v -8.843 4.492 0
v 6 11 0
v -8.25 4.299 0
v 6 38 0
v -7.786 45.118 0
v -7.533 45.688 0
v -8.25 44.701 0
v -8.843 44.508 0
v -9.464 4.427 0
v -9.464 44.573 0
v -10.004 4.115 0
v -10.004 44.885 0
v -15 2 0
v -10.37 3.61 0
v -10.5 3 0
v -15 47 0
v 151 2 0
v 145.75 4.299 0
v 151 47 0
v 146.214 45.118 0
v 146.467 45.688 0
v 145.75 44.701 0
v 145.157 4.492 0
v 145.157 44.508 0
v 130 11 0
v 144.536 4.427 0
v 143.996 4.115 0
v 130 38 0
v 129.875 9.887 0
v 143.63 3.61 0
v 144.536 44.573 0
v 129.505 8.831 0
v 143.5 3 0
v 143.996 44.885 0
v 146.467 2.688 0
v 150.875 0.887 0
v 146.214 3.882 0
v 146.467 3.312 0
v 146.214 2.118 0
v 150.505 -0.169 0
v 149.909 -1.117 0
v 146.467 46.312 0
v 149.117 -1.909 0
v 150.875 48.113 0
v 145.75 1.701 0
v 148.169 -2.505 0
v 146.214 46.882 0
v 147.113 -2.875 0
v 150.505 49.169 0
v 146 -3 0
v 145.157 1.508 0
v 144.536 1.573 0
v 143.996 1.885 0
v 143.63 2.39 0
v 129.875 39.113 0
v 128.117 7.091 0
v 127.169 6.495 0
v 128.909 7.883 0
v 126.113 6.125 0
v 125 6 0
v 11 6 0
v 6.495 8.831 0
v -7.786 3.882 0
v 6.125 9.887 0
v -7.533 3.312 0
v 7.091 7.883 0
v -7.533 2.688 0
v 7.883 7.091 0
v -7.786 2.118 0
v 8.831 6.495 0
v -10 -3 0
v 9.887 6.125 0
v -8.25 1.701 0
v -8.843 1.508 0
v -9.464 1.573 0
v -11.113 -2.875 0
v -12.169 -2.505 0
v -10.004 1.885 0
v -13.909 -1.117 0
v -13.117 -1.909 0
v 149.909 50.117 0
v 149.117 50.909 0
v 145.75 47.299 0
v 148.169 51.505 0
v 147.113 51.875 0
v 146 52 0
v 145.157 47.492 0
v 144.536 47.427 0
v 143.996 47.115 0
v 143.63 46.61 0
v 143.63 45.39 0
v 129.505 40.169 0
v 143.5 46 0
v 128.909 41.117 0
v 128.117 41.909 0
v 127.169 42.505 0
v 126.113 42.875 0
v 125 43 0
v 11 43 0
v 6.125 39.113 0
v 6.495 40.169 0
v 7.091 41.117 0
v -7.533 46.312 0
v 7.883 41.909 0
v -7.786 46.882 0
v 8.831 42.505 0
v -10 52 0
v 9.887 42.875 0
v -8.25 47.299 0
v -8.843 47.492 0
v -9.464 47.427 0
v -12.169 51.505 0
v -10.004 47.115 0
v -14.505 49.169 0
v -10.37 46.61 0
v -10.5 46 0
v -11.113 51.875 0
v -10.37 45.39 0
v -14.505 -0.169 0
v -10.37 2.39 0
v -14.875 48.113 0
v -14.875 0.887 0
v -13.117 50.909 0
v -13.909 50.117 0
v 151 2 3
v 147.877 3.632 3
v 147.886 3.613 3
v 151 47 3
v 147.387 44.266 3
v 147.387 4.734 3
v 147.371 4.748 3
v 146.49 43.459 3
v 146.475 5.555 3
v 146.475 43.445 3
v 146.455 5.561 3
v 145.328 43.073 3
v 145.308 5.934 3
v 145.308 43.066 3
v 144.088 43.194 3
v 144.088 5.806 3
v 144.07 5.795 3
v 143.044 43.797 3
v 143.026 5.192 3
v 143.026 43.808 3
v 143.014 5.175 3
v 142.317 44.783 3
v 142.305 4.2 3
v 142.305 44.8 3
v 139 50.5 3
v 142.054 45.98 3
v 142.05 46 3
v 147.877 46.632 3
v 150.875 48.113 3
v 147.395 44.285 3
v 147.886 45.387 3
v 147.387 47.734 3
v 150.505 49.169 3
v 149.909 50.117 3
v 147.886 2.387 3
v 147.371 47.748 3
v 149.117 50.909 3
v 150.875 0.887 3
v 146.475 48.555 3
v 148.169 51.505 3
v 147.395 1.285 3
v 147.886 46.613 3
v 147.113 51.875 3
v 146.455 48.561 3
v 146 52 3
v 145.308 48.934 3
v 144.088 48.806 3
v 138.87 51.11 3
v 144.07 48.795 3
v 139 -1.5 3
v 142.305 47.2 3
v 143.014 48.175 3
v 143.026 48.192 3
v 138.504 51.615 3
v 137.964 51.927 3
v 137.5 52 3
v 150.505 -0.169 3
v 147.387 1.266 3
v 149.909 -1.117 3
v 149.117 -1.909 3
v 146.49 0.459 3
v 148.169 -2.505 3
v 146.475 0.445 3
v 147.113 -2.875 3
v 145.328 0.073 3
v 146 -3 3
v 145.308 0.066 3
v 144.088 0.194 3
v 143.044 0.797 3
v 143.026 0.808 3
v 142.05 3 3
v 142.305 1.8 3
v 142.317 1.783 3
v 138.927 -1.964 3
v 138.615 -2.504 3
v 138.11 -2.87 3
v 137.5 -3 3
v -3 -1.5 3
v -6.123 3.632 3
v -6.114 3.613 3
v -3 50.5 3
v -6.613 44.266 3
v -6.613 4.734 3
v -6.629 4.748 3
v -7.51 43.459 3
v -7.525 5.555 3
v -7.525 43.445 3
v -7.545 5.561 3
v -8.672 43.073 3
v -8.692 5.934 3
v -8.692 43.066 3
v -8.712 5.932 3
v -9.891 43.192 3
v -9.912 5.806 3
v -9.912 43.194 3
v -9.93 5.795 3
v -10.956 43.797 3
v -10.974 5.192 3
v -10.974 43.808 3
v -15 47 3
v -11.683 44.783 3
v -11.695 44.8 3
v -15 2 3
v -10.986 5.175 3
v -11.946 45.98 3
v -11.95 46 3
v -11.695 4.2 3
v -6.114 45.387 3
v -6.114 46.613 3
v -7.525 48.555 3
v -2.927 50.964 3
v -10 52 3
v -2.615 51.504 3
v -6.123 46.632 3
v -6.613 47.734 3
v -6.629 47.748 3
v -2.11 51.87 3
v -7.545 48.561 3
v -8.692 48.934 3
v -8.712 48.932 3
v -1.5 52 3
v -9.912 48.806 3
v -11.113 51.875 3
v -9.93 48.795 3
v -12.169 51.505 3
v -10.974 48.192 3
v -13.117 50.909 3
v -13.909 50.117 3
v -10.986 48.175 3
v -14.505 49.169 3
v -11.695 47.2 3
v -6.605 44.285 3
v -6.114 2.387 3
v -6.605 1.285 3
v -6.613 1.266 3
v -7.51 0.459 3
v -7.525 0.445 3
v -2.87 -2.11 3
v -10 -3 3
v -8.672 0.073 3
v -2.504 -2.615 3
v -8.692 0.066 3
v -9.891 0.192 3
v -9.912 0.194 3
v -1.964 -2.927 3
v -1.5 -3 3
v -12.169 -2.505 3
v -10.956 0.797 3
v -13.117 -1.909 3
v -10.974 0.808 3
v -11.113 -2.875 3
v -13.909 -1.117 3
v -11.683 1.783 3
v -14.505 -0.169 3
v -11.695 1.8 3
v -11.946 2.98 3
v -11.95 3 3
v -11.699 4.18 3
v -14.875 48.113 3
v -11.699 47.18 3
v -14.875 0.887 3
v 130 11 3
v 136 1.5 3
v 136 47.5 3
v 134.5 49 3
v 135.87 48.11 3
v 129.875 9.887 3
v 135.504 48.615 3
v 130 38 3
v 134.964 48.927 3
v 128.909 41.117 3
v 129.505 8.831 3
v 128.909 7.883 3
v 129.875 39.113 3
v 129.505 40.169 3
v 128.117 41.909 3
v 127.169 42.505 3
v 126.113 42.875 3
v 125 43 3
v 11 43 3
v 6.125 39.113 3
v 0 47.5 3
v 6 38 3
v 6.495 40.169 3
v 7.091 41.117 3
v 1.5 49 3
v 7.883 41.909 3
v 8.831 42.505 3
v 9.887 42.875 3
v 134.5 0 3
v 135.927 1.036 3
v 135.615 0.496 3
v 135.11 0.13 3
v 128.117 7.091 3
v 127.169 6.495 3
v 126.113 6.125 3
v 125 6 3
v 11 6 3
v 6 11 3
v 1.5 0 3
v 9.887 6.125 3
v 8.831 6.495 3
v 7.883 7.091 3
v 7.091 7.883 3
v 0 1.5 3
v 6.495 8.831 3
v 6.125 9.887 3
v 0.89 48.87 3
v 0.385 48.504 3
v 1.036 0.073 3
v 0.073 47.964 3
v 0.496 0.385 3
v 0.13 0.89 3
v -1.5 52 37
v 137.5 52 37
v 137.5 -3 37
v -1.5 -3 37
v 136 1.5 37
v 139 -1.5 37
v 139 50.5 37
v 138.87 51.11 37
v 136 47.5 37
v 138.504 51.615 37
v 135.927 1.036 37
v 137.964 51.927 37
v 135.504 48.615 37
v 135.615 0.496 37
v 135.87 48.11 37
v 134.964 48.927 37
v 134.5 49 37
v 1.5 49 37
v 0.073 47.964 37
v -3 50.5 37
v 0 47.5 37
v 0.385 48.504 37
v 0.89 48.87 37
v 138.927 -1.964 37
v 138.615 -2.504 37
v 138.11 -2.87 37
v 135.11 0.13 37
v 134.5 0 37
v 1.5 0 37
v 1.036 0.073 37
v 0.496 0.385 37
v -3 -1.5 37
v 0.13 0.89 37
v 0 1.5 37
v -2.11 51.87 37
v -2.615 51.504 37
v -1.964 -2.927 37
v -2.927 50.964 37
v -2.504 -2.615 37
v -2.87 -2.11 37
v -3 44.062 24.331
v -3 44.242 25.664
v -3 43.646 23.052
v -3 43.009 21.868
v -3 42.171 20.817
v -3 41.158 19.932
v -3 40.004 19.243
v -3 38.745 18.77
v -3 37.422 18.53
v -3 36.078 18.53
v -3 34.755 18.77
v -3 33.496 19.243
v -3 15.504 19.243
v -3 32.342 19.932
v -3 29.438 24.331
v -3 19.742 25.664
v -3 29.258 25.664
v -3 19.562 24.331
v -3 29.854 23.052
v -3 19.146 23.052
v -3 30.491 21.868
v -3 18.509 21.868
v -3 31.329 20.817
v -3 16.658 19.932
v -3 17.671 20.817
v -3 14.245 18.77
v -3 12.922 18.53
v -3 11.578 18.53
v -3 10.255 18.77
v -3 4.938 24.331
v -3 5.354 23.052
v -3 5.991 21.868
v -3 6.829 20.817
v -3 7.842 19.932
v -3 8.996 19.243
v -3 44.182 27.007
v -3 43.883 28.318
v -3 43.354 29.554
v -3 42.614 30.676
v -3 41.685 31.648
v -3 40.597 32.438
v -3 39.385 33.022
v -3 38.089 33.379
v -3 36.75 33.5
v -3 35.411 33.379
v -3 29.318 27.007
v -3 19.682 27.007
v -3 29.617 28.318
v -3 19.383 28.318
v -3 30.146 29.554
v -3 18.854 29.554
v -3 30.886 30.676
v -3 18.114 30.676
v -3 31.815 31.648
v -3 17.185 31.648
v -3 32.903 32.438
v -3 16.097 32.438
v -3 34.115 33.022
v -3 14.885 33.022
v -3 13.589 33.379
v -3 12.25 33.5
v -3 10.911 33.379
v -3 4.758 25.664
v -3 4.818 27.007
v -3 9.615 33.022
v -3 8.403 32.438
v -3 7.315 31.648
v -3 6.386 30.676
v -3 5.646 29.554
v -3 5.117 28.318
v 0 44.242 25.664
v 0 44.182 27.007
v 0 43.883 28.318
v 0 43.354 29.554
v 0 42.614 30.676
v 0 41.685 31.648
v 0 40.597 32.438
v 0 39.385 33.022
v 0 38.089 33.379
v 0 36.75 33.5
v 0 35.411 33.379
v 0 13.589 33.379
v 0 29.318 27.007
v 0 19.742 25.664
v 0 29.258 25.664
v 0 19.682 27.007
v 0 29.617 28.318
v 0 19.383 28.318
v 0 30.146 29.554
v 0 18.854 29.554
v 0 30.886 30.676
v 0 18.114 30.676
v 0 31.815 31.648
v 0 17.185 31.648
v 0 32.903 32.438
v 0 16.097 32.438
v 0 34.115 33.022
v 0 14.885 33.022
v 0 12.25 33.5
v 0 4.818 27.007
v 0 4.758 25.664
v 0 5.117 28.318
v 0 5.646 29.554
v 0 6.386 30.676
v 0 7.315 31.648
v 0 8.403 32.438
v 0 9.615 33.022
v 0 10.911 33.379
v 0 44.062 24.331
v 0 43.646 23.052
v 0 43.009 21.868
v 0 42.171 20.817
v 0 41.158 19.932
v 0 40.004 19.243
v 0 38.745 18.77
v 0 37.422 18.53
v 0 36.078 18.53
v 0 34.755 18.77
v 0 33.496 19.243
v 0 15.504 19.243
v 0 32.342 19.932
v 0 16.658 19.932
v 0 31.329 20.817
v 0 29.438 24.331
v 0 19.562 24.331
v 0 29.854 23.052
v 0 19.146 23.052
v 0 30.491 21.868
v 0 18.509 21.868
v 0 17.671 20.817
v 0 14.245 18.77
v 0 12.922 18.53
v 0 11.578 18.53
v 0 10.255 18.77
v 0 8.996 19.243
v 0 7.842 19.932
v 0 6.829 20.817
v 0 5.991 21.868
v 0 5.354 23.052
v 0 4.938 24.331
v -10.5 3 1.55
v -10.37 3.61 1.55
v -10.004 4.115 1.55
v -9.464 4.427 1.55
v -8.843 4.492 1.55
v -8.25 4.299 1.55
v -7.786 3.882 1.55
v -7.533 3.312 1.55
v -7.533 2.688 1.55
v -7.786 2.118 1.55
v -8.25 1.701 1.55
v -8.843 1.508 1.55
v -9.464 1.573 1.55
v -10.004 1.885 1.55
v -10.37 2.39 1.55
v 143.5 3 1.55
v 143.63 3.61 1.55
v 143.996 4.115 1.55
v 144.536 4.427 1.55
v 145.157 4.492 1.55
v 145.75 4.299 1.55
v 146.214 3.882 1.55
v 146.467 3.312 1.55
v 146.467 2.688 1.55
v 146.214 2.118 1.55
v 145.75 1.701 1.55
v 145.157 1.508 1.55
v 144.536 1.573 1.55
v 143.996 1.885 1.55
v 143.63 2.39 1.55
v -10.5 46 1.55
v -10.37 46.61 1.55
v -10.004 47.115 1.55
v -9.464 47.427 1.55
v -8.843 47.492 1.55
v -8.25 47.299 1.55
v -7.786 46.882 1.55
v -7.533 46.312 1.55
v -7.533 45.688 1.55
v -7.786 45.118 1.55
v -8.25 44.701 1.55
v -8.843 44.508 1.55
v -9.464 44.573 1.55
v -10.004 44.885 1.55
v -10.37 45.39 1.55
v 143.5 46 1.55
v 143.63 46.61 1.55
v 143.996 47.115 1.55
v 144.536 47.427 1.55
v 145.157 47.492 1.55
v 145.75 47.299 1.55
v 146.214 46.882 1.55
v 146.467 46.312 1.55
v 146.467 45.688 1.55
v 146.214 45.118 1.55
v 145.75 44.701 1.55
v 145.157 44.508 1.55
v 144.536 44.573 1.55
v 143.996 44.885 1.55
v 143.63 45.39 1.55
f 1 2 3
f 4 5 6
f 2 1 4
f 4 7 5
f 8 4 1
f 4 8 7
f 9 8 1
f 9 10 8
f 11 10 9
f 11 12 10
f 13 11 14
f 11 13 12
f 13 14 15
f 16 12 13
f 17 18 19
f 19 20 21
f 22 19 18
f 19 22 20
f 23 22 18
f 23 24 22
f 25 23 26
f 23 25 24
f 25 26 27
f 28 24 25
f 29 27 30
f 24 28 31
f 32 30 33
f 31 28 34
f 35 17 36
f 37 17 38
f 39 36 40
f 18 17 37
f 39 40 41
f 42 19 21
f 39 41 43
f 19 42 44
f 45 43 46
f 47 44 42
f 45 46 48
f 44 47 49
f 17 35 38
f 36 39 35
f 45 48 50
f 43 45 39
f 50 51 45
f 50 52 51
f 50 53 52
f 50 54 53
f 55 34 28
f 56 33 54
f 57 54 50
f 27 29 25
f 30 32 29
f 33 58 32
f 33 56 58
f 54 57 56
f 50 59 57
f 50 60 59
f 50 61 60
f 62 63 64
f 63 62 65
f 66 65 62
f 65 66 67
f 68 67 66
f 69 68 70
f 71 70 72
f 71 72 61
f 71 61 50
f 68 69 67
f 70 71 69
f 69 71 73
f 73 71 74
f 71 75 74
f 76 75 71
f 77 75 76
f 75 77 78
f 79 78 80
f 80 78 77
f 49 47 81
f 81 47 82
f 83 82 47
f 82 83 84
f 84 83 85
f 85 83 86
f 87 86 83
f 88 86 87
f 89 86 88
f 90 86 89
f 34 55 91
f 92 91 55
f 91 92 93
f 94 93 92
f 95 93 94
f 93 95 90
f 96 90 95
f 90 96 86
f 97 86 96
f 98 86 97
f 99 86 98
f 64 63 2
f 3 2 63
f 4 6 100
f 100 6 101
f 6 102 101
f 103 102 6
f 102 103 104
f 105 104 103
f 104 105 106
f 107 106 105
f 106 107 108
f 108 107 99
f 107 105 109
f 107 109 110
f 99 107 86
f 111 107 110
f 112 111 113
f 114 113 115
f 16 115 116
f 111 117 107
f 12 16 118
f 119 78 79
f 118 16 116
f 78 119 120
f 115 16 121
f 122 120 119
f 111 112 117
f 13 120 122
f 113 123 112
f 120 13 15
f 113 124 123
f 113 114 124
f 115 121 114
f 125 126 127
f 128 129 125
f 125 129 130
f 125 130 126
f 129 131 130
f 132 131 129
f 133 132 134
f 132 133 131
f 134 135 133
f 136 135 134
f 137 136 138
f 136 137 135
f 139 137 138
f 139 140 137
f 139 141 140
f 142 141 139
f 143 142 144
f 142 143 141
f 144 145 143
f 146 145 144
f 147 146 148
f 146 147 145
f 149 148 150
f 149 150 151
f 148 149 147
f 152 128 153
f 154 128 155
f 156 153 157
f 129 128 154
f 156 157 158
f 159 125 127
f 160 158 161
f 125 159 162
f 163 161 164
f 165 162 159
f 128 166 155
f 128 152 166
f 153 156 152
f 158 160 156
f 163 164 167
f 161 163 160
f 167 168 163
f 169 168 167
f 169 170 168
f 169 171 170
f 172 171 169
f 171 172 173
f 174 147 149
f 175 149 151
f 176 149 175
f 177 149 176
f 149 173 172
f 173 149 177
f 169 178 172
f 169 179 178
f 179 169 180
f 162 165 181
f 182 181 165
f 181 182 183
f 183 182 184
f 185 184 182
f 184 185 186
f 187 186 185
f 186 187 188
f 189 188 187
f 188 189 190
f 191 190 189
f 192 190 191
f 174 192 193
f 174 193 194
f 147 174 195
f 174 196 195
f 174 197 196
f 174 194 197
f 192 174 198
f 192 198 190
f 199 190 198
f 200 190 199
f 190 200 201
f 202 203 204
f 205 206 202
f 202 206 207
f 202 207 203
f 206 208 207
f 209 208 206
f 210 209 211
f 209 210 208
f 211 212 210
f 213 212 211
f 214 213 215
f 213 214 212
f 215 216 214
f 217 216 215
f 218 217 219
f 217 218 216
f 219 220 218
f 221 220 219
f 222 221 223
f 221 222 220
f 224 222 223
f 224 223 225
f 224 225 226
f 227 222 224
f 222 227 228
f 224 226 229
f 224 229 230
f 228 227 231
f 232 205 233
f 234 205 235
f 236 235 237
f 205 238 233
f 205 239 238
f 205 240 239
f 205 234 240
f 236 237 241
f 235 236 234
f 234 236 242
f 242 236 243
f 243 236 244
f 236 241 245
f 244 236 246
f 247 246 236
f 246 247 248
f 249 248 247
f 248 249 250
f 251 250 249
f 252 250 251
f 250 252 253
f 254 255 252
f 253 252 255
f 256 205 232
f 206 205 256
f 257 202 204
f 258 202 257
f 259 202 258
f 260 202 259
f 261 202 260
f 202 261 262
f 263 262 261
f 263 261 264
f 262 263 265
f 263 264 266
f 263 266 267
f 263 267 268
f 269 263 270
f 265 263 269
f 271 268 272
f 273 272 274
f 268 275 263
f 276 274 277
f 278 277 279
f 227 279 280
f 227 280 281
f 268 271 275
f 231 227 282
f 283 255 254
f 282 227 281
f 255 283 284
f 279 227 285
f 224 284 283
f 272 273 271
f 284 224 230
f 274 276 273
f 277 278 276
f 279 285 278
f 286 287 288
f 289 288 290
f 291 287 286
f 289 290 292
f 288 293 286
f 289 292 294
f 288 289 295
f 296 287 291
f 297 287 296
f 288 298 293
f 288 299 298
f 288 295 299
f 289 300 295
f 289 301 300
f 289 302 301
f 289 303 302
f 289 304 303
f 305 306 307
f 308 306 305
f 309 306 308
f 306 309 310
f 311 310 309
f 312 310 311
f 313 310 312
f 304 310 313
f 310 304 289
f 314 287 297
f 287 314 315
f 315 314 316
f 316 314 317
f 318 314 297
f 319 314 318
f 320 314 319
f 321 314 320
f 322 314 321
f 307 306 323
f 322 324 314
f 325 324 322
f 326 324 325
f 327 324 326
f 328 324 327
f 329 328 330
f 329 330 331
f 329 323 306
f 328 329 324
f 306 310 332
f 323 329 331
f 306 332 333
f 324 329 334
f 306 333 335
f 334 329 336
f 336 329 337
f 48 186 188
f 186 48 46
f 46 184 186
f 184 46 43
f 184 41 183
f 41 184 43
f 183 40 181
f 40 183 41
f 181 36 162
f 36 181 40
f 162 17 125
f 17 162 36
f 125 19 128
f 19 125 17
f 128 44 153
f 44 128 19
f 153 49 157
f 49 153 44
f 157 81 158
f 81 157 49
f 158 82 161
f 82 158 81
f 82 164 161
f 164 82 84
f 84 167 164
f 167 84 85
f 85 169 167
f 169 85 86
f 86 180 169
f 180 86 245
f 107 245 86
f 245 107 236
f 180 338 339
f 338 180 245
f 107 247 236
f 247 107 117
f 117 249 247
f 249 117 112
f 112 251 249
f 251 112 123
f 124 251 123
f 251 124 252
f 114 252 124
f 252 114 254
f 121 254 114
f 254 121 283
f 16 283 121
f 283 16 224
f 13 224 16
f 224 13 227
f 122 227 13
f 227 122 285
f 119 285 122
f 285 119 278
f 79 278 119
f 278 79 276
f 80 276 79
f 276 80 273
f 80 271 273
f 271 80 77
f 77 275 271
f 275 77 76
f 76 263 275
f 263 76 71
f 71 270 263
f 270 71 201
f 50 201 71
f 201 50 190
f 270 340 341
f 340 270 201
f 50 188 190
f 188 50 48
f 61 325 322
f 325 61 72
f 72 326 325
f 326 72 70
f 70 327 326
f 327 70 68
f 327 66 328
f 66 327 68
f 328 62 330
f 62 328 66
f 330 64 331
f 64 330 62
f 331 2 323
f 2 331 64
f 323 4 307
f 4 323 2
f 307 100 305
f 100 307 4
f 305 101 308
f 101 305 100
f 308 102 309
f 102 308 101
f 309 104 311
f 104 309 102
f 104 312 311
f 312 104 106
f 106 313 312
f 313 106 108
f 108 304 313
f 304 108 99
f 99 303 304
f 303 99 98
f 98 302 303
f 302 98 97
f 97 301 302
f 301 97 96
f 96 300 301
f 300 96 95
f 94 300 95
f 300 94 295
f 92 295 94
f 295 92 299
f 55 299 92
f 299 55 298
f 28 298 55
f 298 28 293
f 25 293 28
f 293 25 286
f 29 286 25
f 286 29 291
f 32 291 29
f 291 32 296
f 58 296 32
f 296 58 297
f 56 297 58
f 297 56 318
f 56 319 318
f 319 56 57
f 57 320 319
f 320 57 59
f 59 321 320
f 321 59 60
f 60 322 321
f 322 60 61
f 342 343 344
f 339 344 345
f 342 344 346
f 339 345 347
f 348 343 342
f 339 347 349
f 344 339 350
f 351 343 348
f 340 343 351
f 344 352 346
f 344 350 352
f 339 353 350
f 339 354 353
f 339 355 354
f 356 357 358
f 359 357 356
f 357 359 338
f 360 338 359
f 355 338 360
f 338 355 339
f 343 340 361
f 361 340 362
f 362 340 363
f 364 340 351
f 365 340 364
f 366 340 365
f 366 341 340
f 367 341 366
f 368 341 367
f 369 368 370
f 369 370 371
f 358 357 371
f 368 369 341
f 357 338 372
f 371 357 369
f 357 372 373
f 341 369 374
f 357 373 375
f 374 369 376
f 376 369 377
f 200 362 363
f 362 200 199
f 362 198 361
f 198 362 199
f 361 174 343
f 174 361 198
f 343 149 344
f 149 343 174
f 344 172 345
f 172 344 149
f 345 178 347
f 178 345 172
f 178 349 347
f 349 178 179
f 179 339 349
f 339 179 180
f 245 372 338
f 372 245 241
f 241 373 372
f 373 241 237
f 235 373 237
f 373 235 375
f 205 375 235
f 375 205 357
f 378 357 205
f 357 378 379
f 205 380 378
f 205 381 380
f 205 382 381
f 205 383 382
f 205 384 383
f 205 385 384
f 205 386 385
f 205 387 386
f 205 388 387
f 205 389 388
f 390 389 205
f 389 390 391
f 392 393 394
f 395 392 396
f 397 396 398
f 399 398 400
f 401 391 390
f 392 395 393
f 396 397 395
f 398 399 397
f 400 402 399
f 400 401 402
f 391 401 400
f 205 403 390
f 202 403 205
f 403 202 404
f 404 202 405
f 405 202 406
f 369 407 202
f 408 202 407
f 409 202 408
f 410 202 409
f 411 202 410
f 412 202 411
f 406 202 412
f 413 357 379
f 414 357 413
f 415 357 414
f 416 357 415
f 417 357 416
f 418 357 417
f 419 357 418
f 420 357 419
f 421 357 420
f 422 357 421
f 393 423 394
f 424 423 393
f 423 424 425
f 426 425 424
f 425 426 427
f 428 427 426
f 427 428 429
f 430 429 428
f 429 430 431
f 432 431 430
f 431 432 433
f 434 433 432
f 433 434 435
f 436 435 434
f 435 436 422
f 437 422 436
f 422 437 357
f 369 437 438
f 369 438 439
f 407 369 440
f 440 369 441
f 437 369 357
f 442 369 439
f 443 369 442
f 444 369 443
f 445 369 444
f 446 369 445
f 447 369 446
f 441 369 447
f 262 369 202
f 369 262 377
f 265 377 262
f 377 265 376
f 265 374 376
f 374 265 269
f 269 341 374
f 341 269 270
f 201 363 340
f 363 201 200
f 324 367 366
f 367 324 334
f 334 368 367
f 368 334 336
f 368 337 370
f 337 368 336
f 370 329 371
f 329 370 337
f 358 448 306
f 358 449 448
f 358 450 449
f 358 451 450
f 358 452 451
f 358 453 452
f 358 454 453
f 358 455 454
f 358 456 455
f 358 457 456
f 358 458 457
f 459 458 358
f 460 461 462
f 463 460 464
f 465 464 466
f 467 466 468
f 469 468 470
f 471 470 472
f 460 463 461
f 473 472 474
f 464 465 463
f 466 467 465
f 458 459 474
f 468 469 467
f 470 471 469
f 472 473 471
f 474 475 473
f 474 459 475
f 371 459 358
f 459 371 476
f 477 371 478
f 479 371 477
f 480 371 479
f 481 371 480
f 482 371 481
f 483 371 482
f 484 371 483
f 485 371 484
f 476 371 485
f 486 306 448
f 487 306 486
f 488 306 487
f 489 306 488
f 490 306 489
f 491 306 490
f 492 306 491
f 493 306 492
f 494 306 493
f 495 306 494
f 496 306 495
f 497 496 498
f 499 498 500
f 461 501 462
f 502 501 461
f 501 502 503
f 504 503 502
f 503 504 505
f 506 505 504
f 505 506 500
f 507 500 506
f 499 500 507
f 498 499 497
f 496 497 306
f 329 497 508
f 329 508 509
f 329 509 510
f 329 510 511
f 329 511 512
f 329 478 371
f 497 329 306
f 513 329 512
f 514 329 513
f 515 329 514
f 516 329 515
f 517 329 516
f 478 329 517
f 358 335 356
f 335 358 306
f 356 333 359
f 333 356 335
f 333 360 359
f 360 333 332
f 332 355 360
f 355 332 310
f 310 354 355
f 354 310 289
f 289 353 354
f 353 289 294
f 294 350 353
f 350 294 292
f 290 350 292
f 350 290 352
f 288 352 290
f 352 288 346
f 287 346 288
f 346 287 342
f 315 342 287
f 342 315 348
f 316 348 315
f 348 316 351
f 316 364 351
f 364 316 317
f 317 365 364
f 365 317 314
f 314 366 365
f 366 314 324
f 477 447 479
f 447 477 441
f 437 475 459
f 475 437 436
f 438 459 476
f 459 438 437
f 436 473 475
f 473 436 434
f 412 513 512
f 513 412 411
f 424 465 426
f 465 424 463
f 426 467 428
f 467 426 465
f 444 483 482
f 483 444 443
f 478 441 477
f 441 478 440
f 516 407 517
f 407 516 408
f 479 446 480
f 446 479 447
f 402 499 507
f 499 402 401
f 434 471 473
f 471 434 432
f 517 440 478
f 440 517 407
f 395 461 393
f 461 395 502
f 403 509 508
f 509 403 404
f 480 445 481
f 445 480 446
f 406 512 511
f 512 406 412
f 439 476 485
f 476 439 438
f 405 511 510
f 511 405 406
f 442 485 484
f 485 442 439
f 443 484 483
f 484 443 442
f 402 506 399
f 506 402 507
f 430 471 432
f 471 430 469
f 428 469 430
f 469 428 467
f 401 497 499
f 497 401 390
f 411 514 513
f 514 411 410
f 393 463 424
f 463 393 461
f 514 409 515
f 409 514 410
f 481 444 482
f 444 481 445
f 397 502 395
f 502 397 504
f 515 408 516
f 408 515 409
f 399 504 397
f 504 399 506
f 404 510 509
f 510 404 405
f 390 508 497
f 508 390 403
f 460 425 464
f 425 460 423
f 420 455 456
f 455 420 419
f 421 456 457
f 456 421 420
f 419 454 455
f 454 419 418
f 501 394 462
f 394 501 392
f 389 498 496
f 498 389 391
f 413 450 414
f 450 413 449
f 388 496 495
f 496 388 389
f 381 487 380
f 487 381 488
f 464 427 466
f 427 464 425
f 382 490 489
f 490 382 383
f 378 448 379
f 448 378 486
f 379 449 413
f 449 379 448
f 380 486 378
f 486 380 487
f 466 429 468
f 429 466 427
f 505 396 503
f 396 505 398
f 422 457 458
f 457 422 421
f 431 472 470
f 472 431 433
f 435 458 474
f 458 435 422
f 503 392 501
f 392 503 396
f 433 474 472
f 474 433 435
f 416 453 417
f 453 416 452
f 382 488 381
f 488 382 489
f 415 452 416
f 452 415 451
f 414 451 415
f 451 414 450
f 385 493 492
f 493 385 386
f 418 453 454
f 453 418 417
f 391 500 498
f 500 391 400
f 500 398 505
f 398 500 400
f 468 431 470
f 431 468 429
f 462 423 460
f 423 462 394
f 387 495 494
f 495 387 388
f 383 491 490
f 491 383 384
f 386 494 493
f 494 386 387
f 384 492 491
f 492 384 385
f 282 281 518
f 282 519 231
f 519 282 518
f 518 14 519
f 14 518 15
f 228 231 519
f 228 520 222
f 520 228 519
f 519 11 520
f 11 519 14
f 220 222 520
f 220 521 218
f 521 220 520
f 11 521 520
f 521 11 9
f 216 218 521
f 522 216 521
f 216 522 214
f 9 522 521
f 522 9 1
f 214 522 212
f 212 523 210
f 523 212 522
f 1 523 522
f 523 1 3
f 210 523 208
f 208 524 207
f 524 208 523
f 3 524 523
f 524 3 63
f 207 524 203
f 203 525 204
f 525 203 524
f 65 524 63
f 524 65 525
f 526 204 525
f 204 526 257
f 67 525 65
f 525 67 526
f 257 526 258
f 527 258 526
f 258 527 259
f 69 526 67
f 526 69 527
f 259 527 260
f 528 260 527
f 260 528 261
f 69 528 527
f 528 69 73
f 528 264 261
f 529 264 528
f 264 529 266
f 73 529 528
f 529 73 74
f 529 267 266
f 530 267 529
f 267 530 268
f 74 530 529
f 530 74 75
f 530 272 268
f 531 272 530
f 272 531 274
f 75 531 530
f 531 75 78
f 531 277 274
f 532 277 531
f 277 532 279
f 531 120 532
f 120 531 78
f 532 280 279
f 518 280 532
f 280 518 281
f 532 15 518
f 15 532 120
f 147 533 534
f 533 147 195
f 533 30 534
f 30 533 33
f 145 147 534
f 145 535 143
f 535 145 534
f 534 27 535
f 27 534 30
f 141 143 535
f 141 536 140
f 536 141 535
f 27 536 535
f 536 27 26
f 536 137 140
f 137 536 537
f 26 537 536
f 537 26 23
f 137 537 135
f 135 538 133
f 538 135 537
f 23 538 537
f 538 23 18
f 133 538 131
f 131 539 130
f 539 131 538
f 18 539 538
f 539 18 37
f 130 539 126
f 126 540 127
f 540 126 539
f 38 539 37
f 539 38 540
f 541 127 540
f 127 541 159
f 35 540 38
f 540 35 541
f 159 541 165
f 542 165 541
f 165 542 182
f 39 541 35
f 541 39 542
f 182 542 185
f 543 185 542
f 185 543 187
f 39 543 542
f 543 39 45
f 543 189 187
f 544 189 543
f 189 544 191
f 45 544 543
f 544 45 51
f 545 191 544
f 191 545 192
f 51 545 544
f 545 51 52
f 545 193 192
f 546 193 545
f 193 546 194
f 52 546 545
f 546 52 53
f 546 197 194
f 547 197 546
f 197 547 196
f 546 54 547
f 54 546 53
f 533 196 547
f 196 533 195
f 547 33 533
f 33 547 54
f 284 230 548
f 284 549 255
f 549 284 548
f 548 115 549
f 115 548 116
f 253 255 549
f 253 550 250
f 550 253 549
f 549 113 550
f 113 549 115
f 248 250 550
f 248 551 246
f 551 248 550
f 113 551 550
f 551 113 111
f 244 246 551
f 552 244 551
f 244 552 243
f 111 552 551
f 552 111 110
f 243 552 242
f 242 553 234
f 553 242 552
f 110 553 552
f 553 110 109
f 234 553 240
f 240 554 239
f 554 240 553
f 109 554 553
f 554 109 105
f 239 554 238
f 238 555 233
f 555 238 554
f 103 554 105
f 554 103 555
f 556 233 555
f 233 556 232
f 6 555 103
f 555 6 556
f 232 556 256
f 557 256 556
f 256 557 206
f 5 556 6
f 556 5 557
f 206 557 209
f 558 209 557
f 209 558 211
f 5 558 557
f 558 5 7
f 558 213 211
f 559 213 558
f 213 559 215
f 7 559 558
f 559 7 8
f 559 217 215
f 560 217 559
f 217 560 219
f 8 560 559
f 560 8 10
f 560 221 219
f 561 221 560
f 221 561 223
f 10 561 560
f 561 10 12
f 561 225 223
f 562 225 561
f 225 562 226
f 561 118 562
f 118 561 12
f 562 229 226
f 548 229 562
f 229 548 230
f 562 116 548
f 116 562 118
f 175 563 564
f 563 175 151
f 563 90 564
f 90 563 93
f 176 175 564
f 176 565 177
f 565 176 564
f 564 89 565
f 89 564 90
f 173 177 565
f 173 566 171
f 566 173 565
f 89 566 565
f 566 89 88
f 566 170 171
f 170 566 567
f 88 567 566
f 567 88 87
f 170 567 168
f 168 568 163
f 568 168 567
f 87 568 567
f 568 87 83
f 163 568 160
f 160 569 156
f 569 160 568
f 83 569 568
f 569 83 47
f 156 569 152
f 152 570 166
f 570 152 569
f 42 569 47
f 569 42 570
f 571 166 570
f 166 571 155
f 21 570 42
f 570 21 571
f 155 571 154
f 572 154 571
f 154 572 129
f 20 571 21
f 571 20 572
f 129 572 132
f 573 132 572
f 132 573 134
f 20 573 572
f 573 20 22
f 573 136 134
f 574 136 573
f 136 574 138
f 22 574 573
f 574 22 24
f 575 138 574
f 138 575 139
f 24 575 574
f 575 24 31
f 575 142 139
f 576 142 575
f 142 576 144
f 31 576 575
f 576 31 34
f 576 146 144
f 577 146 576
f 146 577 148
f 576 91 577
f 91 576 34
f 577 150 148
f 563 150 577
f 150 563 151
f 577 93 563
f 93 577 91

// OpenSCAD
//------------------------------------------------------------------
/*

Battery Holder

2 x 3000 mAh 7.2V battery packs
See- http://www.tenergy.com, Item #11204-01

*/
//------------------------------------------------------------------
/* [Global] */

/*[General]*/
box_h = 34;
box_w = 49; // 2 batteries side by side
box_l = 136; // slightly longer to allow diagonal insertion
connector_d = 15; // hole for tamiya connector pass-thru
connector_z = 23; // z position of connector hole

/*[Preferences]*/
wall_t = 3; // wall thickness
wall_r = 1.5; // wall corner rounding
foot_inset = 6; // foot inset
foot_r = 5; // foot rounding
foot_h = 3; // foot height
foot_l = 12; // foot length
foot_hole_d = 3; // hole diameter for mounting foot
hole_to_edge = 6;

/* [Hidden] */
//------------------------------------------------------------------

// small tweak to avoid differencing artifacts
epsilon = 0.05;

// control the number of facets on cylinders
facet_epsilon = 0.03;
function facets(r) = 180 / acos(1 - (facet_epsilon / r));

// rounded polygons
module rounded(r=1) {
  offset(r=r, $fn=facets(r)) offset(r=-r, $fn=facets(r)) children(0);
}

// filleted polygons
module filleted(r=1) {
  offset(r=-r, $fn=facets(r)) render() offset(r=r, $fn=facets(r)) children(0);
}

//------------------------------------------------------------------

module wall_2d(t) {
  wall = 2 * t;
  p = [
    [0,0],
    [box_l + wall,0],
    [box_l + wall,box_w + wall],
    [0,box_w + wall],
  ];
  polygon(points=p);
}

module wall() {
  linear_extrude(height=box_h + epsilon, convexity = 2) difference() {
    translate([-wall_t, -wall_t]) rounded(wall_r) wall_2d(wall_t);
    rounded(wall_r) wall_2d(0);
  }
}

//------------------------------------------------------------------

module foot_2d() {
  x = 2 * (wall_t + foot_l);
  y = 2 * wall_t;
  p = [
    [0,0],
    [box_l + x,0],
    [box_l + x, box_w + y],
    [0,box_w + y],
  ];
  polygon(points=p);
}

module foot() {
  linear_extrude(height=foot_h) difference() {
    translate([-foot_l - wall_t, -wall_t]) rounded(foot_r) foot_2d();
    translate([foot_inset, foot_inset]) rounded(foot_r) wall_2d(-foot_inset);
  }
}

//------------------------------------------------------------------

module connector_hole() {
  h = wall_t + (2 * epsilon);
  r = connector_d / 2;
  cylinder(h=h, r=r, $fn=facets(r));
}

module connector_holes() {
  d = box_w / 2;
  yofs = d / 2;
  zofs = foot_h + connector_z;
  translate([epsilon,0,zofs]) rotate([0,-90,0]) translate([0,yofs,0]) {
    connector_hole();
    translate([0,d,0]) connector_hole();
  }
}

//------------------------------------------------------------------

module hole_countersunk(
  length,
  radius,
) {
  l = length;
  r = radius;
  if (r > l) {
    points = [
      [0, 0],
      [(2 * r) - l, 0],
      [2 * r, l],
      [0, l]
    ];
    rotate_extrude($fn=facets(r)) polygon(points=points);
  } else {
    points = [
      [0, 0],
      [r, 0],
      [r, l - r],
      [2 * r, l],
      [0, l]
    ];
    rotate_extrude($fn=facets(r)) polygon(points=points);
  }
}

module foot_holes() {
  l = foot_h + (2 * epsilon);
  r = foot_hole_d / 2;
  x = box_l + 2 * (wall_t + foot_l - hole_to_edge);
  y = box_w + 2 * (wall_t - hole_to_edge);
  xofs = foot_l - hole_to_edge + wall_t;
  yofs = hole_to_edge - wall_t;
  translate([-xofs, yofs,-epsilon]) {
    translate([0,0]) hole_countersunk(l,r);
    translate([x,0]) hole_countersunk(l,r);
    translate([0,y]) hole_countersunk(l,r);
    translate([x,y]) hole_countersunk(l,r);
  }
}

//------------------------------------------------------------------

module holder() {
  difference() {
    union() {
      foot();
      translate([0,0,foot_h - epsilon]) wall();
    }
    union() {
      connector_holes();
      foot_holes();
    }
  }
}

holder();

//------------------------------------------------------------------
